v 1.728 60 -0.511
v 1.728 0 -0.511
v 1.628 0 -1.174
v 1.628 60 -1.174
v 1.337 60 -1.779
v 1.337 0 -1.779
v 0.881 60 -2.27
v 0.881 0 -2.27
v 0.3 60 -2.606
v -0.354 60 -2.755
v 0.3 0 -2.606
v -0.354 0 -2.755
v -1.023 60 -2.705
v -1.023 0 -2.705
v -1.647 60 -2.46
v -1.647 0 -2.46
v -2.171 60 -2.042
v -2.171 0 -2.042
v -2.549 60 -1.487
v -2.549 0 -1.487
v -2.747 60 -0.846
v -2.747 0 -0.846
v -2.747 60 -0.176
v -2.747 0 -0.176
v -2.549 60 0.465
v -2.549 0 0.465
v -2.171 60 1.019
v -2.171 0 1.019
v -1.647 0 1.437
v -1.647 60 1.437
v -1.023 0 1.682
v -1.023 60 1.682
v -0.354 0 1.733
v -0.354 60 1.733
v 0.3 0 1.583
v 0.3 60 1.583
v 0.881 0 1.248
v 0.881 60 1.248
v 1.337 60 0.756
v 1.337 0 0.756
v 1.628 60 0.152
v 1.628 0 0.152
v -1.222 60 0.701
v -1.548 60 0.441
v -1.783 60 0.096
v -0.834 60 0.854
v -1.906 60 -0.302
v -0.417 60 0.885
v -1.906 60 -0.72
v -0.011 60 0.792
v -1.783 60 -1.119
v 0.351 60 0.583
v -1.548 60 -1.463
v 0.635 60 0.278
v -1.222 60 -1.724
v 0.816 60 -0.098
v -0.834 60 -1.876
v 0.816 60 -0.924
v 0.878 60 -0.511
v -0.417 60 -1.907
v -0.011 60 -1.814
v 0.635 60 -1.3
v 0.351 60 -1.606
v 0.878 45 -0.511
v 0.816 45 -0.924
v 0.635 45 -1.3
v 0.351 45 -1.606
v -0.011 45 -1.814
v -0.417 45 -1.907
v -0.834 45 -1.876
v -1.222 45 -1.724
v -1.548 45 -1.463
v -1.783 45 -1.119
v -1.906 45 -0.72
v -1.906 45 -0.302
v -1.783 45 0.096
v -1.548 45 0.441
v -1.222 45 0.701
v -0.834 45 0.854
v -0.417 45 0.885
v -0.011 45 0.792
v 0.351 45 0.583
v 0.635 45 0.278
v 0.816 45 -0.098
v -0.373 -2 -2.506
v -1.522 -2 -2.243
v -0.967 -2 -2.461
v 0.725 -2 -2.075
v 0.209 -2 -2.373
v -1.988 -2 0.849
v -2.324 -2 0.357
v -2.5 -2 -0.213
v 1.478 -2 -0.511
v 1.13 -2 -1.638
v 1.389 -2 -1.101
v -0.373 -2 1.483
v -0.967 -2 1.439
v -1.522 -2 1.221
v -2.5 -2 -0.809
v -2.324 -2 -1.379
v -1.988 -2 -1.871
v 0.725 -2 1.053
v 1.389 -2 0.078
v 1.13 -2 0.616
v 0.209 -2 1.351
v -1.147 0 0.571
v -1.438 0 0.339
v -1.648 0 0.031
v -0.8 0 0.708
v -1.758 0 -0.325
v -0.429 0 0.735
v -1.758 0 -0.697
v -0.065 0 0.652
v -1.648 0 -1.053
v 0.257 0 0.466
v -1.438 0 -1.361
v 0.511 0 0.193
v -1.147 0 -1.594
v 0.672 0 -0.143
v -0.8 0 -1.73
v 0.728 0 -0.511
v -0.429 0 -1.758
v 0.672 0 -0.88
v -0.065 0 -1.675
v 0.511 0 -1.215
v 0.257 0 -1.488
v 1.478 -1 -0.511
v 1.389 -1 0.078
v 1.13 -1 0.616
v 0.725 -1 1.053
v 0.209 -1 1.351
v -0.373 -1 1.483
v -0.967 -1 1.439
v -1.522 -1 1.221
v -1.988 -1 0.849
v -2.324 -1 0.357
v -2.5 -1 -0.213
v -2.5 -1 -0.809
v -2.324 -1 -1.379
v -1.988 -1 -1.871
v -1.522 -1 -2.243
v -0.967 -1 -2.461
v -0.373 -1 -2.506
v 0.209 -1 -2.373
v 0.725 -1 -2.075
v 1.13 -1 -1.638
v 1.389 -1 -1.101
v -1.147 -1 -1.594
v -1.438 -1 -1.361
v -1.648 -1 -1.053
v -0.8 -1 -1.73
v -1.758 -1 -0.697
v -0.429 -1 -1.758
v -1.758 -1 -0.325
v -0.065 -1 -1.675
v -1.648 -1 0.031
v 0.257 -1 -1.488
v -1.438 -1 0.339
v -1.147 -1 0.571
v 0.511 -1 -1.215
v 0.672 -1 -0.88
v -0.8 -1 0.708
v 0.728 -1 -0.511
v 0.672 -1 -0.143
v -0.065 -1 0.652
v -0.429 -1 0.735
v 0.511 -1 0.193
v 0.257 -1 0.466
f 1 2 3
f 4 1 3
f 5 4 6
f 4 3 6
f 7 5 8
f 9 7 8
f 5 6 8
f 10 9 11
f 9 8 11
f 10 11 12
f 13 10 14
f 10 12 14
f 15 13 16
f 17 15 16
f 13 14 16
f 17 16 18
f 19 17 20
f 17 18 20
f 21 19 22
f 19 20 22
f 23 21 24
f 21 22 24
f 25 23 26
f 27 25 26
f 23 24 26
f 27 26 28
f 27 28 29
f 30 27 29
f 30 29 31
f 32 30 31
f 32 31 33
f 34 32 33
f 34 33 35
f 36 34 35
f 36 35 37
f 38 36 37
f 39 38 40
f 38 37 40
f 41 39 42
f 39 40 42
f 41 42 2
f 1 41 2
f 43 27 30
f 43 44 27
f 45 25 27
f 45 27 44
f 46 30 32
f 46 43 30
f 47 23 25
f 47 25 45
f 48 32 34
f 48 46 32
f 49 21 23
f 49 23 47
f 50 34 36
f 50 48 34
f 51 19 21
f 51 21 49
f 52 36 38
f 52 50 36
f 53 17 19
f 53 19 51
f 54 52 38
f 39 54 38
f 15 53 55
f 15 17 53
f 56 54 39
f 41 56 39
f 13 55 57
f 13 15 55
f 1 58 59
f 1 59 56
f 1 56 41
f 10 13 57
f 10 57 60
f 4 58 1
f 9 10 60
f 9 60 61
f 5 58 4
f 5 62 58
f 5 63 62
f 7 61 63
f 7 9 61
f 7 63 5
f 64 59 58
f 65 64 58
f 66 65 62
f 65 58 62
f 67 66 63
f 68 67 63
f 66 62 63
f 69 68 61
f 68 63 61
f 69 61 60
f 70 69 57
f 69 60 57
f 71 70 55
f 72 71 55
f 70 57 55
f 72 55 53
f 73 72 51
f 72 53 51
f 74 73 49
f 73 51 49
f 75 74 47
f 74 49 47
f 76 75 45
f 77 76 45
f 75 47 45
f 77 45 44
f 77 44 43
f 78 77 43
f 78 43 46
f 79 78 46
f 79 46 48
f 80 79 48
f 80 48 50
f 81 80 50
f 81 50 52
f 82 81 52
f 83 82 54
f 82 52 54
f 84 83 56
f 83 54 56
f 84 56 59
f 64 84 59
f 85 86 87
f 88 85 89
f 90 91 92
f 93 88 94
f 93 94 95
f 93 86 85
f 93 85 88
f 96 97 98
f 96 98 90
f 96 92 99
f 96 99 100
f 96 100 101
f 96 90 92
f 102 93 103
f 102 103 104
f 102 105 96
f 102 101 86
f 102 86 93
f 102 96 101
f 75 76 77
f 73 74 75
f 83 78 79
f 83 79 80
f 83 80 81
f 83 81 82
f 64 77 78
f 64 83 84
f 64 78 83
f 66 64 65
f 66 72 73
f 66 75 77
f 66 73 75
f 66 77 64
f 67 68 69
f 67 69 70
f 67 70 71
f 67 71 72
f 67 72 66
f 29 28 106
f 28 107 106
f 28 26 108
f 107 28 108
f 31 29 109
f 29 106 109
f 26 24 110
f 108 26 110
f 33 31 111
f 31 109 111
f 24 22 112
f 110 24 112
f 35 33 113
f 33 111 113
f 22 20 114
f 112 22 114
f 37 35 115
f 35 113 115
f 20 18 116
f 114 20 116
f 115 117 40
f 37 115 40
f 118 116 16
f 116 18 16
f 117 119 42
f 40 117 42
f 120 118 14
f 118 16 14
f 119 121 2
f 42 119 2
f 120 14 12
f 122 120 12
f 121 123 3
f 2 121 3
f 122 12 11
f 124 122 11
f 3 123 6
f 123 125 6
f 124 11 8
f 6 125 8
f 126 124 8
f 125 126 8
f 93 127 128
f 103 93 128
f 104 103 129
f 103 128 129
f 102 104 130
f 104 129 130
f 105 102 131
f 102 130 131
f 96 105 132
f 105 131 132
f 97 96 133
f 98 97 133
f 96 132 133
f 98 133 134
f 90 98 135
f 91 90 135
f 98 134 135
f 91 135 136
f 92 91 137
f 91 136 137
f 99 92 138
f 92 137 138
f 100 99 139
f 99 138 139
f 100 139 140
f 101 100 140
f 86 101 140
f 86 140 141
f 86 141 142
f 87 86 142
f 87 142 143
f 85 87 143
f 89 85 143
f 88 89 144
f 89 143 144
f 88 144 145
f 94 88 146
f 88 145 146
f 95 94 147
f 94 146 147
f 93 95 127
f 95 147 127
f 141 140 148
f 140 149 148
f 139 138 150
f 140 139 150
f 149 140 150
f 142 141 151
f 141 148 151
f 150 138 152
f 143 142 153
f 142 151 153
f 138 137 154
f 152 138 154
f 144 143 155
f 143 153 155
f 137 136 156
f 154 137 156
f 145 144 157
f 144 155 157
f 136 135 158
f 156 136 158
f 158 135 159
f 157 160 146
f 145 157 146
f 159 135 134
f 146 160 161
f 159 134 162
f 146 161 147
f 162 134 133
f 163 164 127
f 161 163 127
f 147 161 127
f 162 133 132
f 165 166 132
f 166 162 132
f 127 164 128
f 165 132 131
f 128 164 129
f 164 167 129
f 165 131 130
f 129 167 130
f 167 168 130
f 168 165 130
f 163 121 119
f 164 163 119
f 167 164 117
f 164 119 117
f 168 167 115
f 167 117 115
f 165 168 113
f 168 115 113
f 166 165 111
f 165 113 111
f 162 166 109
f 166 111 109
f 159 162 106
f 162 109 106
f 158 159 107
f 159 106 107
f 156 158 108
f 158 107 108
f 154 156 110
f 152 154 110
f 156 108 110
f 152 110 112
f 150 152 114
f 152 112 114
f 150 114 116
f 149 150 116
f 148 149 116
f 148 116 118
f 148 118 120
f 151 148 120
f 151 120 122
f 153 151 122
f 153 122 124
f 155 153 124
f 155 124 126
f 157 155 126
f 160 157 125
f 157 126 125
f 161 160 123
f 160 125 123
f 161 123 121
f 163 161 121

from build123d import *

# Parameters (mm, degrees)
SKETCH1_R           = 2.25
BOSS_EXTRUDE1_DEPTH = 60
SKETCH1_3_R         = 1.375
BOSS_EXTRUDE2_DEPTH = 1
SKETCH5_R           = 1.25
BOSS_EXTRUDE3_DEPTH = 1
SKETCH6_R           = 2
BOSS_EXTRUDE4_DEPTH = 1
SKETCH12_R          = 1.4
CUT_EXTRUDE1_DEPTH  = 15


with BuildPart() as part:
    # Sketch1 → Boss-Extrude1 (new body)
    with BuildSketch(Plane(origin=(0, 0, 0), x_dir=(1, 0, 0), z_dir=(0, 1, 0))):
        with Locations((-0.522013312, 0.511138034)):
            Circle(SKETCH1_R)
    extrude(amount=BOSS_EXTRUDE1_DEPTH)

    # Sketch1<3> → Boss-Extrude2 (add)
    with BuildSketch(Plane(origin=(0, 0, 0), x_dir=(1, 0, 0), z_dir=(0, 1, 0))):
        with Locations((-0.522013312, 0.511138034)):
            Circle(SKETCH1_3_R)
    extrude(amount=BOSS_EXTRUDE2_DEPTH)

    # Sketch5 → Boss-Extrude3 (add)
    with BuildSketch(Plane.XZ):
        with Locations((-0.522013312, -0.511138034)):
            Circle(SKETCH5_R)
    extrude(amount=BOSS_EXTRUDE3_DEPTH)

    # Sketch6 → Boss-Extrude4 (add)
    with BuildSketch(Plane.XZ.offset(1)):
        with Locations((-0.522013312, -0.511138034)):
            Circle(SKETCH6_R)
    extrude(amount=BOSS_EXTRUDE4_DEPTH)

    # Sketch12 → Cut-Extrude1 (cut)
    with BuildSketch(Plane(origin=(0, 60, 0), x_dir=(1, 0, 0), z_dir=(0, 1, 0))):
        with Locations((-0.522013312, 0.511138034)):
            Circle(SKETCH12_R)
    extrude(amount=-CUT_EXTRUDE1_DEPTH, mode=Mode.SUBTRACT)


solid = part.part
